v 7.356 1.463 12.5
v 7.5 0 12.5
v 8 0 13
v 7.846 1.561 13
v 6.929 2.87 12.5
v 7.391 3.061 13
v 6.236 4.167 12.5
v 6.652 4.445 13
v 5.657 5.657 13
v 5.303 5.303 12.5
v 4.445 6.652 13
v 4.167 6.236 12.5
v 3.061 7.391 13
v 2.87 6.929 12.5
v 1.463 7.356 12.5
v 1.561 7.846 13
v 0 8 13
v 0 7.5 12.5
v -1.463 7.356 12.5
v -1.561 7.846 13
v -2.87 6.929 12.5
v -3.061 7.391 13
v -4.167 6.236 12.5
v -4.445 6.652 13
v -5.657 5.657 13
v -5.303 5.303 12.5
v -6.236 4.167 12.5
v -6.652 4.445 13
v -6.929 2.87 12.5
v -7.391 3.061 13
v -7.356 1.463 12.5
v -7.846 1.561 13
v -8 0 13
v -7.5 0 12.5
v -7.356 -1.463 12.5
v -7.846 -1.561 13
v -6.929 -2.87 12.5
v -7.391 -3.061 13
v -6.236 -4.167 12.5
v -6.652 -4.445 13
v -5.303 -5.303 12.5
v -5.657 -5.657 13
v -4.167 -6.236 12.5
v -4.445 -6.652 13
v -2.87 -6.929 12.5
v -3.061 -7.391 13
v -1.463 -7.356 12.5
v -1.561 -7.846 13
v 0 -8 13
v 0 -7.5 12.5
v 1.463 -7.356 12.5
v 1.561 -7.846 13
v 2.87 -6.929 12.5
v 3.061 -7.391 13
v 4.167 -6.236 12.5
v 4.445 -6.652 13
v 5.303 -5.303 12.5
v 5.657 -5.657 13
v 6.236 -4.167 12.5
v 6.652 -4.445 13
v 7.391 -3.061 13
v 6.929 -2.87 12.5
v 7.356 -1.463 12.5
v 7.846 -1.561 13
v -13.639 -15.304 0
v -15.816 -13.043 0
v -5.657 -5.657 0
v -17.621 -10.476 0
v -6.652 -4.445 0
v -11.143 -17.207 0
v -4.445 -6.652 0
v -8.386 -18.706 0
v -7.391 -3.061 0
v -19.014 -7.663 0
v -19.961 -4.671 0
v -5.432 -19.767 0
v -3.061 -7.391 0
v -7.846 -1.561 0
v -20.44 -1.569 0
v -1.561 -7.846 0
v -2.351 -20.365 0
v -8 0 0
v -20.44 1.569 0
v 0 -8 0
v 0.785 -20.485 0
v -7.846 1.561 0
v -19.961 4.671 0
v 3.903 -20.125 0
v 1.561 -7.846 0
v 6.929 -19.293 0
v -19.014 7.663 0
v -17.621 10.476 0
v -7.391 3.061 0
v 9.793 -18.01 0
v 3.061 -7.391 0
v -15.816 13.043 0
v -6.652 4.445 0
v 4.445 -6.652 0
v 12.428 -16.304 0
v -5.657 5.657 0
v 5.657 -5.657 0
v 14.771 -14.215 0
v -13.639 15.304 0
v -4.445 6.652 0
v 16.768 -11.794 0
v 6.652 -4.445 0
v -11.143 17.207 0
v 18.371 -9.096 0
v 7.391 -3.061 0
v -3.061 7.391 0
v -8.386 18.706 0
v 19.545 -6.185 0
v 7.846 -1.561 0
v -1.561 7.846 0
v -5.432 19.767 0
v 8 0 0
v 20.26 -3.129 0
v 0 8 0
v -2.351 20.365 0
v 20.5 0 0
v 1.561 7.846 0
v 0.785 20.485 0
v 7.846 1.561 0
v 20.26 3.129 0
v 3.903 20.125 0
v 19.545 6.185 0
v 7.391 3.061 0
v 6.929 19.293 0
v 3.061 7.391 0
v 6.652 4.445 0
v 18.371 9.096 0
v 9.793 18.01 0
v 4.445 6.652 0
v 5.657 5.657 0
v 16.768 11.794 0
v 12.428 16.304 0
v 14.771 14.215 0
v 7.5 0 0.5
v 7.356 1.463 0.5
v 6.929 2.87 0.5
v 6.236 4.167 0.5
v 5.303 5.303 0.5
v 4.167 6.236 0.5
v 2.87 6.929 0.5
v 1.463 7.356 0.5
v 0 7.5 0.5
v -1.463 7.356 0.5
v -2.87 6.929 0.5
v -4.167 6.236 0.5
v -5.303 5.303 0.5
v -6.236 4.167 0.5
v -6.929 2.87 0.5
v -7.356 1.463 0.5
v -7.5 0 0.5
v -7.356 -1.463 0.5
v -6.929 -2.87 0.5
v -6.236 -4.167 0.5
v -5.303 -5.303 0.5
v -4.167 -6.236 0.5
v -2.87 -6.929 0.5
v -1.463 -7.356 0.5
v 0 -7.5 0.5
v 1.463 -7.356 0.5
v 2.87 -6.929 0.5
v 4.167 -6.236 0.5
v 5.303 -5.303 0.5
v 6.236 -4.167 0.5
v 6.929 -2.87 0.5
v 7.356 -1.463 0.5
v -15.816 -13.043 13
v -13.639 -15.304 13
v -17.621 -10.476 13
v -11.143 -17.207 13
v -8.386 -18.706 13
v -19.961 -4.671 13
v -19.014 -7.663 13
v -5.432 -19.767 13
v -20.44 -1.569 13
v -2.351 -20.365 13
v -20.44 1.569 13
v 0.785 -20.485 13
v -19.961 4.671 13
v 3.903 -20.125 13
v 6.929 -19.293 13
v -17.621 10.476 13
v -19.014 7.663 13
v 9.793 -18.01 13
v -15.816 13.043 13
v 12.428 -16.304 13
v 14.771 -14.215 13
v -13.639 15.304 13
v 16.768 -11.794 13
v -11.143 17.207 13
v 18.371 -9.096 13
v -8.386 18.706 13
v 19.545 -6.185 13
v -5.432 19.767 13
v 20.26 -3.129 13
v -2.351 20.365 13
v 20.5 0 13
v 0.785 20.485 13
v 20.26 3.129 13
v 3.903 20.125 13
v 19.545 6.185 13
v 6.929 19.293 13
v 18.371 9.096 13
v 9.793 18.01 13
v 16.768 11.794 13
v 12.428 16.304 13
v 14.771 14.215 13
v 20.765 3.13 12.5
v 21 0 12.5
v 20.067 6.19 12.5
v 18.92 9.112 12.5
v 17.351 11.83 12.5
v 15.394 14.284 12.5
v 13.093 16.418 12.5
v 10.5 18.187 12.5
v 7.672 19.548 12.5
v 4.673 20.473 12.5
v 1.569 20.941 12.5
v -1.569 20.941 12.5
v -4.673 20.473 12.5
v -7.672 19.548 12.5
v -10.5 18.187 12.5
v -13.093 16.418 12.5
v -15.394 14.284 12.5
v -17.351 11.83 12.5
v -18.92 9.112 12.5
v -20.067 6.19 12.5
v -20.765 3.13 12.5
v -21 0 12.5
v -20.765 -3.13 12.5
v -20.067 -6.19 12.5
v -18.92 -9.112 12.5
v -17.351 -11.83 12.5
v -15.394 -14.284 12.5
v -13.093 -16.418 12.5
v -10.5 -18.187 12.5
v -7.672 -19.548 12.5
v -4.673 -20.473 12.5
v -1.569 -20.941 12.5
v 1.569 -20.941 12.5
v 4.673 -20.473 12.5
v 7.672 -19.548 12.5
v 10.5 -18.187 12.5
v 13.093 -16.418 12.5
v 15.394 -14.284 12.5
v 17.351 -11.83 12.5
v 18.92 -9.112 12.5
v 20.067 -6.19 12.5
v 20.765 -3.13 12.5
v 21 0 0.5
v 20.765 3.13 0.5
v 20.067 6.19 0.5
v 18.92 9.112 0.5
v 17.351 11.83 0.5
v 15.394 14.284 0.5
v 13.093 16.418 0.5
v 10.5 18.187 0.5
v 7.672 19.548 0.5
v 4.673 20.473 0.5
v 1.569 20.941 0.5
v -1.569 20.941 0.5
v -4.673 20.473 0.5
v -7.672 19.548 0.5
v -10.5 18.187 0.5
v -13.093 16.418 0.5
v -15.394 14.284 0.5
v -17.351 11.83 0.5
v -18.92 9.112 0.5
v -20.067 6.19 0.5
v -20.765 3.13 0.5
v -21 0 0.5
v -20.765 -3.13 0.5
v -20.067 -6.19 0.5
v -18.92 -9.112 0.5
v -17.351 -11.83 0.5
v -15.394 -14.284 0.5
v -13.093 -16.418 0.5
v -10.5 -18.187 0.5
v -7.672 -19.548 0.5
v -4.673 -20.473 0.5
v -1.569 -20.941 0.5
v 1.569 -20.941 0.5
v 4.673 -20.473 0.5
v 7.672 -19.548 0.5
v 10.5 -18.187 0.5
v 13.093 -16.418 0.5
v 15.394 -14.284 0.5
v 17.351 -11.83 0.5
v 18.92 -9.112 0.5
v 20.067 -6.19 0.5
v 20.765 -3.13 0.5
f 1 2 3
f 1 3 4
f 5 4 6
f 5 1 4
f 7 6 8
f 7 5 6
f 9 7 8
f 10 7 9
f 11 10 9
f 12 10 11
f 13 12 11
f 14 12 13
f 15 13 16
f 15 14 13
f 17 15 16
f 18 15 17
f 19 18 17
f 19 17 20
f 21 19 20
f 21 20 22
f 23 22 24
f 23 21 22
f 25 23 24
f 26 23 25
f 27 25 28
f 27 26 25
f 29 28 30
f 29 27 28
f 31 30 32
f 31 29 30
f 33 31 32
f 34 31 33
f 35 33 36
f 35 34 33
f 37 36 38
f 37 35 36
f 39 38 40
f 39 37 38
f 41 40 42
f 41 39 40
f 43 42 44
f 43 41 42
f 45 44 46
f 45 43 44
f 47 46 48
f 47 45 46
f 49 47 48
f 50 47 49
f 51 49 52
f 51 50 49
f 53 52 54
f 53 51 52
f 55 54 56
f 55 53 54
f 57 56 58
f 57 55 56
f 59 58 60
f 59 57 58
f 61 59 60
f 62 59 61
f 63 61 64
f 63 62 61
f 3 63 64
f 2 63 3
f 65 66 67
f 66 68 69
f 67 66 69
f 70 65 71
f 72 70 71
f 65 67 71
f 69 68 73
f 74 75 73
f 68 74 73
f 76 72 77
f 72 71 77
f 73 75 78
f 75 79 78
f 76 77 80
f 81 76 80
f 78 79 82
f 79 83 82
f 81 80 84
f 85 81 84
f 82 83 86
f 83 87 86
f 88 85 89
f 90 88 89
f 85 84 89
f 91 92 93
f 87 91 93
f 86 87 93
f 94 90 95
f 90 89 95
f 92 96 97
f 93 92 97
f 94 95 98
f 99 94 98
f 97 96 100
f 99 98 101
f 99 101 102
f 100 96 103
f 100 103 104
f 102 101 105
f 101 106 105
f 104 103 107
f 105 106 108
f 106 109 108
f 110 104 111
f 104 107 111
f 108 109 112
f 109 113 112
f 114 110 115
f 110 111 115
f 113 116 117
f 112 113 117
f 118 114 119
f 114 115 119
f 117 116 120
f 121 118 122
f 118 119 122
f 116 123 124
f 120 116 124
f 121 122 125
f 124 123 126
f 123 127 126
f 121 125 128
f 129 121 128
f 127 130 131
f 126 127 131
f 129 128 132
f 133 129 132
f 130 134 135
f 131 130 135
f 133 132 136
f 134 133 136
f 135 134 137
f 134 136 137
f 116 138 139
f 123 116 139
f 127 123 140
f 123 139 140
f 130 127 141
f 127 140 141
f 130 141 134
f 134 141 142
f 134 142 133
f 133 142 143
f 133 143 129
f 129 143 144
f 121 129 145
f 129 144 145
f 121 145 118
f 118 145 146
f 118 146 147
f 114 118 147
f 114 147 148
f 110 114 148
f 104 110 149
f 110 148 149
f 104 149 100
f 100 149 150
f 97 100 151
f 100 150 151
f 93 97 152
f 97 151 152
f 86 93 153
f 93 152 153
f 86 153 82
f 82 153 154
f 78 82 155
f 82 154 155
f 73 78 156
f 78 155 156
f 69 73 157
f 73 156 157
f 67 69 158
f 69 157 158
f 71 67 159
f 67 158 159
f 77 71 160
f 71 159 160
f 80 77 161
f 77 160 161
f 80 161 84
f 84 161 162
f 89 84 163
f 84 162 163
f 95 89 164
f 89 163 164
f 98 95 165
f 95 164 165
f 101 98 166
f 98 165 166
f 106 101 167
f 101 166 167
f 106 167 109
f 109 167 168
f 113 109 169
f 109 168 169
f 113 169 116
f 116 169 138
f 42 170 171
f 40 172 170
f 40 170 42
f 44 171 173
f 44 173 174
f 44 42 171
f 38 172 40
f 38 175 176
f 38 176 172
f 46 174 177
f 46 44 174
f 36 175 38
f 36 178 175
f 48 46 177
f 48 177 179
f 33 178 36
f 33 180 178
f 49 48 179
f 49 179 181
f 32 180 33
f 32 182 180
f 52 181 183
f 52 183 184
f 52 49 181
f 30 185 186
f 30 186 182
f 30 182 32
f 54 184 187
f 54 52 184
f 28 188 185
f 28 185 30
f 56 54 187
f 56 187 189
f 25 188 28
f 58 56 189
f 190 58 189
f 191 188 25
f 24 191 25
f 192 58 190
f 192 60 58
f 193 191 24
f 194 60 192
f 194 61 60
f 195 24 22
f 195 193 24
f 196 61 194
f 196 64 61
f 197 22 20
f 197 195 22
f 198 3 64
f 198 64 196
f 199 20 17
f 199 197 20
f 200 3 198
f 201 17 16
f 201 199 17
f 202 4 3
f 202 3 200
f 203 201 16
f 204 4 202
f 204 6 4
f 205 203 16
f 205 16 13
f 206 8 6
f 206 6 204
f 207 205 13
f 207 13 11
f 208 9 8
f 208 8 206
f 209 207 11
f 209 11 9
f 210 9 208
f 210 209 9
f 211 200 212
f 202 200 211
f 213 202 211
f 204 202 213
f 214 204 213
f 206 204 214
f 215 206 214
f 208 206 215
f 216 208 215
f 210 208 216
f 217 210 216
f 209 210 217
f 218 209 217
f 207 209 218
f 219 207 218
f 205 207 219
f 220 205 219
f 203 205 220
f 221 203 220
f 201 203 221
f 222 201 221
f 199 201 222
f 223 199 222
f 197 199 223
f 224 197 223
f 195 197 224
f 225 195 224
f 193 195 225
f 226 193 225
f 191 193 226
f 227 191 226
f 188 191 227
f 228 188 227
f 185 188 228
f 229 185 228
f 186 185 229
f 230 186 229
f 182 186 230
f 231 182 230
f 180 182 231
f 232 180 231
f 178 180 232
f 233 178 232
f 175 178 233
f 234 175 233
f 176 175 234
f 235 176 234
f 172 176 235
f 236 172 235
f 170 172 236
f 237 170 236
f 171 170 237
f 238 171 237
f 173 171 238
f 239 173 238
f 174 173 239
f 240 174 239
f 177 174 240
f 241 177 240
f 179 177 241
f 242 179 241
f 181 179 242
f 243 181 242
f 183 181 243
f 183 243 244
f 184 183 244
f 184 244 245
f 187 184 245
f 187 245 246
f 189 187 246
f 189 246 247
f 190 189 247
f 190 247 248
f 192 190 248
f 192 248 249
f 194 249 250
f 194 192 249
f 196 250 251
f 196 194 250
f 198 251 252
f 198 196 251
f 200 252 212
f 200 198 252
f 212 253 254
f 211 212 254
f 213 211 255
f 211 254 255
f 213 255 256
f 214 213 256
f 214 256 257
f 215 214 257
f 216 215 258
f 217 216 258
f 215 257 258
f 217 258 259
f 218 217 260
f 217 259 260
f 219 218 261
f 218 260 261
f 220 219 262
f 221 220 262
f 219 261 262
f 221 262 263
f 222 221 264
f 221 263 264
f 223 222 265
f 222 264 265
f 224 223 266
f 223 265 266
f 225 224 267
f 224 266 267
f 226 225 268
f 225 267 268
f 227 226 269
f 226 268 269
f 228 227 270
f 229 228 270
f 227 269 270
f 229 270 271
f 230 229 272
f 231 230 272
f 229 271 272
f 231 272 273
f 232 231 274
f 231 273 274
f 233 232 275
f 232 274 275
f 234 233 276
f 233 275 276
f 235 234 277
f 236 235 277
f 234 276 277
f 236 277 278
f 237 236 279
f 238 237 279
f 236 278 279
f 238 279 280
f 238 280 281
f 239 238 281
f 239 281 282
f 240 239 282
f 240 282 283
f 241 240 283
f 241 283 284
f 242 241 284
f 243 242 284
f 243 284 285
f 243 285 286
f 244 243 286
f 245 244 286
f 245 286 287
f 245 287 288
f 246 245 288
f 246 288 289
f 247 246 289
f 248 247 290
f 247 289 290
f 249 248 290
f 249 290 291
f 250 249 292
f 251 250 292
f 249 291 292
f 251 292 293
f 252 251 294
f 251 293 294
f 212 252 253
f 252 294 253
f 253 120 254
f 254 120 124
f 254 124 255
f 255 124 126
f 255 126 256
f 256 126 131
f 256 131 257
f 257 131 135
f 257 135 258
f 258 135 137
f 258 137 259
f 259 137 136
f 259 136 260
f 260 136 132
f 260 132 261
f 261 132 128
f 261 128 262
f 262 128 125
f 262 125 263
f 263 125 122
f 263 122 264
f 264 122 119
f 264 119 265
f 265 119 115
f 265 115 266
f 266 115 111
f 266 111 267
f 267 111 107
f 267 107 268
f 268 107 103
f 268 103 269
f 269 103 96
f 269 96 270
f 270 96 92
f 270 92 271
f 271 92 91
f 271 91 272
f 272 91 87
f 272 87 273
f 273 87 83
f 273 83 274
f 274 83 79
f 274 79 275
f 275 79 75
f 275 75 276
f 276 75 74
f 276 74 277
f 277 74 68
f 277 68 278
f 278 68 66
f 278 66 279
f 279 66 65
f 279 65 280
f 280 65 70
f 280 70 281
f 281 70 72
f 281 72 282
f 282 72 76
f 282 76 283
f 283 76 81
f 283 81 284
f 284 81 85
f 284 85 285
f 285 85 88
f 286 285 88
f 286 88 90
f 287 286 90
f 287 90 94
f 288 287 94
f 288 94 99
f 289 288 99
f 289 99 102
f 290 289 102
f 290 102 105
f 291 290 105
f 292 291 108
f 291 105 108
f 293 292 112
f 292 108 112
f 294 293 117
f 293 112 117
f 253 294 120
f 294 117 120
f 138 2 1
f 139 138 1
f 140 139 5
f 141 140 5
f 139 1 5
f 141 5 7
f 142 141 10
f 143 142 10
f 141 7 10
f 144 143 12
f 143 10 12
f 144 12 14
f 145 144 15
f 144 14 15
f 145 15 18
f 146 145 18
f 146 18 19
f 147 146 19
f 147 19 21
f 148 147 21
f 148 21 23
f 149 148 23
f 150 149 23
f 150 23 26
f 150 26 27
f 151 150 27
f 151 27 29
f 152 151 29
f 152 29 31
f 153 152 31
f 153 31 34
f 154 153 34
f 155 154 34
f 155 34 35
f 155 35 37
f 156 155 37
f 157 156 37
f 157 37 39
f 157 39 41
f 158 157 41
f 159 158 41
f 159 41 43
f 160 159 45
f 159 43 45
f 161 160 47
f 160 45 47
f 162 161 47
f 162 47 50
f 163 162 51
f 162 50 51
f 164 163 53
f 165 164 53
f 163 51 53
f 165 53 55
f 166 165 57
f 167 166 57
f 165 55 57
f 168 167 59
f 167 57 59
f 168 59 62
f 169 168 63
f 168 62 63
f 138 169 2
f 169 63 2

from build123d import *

# Parameters (mm, degrees)
F0_R     = 21
F1_DEPTH = 13
F2_R     = 7.5
F3_DEPTH = 37.3
F4_SIZE  = 0.5


with BuildPart() as f1:
    # F0 (on Top) → F1 (new body)
    with BuildSketch(Plane.XY):
        Circle(F0_R)
    extrude(amount=F1_DEPTH)

    # F2 (on face) → F3 (cut)
    with BuildSketch(Plane.XY.offset(13)):
        Circle(F2_R)
    extrude(amount=-F3_DEPTH, mode=Mode.SUBTRACT)

    # F4
    f4_edges = [f1.edges().sort_by_distance(p)[0] for p in [
        (-21, 0, 13),
        (-7.5, 0, 13),
        (-21, 0, 0),
        (-7.5, 0, 0),
    ]]
    chamfer(f4_edges, length=F4_SIZE)


solid = f1.part
